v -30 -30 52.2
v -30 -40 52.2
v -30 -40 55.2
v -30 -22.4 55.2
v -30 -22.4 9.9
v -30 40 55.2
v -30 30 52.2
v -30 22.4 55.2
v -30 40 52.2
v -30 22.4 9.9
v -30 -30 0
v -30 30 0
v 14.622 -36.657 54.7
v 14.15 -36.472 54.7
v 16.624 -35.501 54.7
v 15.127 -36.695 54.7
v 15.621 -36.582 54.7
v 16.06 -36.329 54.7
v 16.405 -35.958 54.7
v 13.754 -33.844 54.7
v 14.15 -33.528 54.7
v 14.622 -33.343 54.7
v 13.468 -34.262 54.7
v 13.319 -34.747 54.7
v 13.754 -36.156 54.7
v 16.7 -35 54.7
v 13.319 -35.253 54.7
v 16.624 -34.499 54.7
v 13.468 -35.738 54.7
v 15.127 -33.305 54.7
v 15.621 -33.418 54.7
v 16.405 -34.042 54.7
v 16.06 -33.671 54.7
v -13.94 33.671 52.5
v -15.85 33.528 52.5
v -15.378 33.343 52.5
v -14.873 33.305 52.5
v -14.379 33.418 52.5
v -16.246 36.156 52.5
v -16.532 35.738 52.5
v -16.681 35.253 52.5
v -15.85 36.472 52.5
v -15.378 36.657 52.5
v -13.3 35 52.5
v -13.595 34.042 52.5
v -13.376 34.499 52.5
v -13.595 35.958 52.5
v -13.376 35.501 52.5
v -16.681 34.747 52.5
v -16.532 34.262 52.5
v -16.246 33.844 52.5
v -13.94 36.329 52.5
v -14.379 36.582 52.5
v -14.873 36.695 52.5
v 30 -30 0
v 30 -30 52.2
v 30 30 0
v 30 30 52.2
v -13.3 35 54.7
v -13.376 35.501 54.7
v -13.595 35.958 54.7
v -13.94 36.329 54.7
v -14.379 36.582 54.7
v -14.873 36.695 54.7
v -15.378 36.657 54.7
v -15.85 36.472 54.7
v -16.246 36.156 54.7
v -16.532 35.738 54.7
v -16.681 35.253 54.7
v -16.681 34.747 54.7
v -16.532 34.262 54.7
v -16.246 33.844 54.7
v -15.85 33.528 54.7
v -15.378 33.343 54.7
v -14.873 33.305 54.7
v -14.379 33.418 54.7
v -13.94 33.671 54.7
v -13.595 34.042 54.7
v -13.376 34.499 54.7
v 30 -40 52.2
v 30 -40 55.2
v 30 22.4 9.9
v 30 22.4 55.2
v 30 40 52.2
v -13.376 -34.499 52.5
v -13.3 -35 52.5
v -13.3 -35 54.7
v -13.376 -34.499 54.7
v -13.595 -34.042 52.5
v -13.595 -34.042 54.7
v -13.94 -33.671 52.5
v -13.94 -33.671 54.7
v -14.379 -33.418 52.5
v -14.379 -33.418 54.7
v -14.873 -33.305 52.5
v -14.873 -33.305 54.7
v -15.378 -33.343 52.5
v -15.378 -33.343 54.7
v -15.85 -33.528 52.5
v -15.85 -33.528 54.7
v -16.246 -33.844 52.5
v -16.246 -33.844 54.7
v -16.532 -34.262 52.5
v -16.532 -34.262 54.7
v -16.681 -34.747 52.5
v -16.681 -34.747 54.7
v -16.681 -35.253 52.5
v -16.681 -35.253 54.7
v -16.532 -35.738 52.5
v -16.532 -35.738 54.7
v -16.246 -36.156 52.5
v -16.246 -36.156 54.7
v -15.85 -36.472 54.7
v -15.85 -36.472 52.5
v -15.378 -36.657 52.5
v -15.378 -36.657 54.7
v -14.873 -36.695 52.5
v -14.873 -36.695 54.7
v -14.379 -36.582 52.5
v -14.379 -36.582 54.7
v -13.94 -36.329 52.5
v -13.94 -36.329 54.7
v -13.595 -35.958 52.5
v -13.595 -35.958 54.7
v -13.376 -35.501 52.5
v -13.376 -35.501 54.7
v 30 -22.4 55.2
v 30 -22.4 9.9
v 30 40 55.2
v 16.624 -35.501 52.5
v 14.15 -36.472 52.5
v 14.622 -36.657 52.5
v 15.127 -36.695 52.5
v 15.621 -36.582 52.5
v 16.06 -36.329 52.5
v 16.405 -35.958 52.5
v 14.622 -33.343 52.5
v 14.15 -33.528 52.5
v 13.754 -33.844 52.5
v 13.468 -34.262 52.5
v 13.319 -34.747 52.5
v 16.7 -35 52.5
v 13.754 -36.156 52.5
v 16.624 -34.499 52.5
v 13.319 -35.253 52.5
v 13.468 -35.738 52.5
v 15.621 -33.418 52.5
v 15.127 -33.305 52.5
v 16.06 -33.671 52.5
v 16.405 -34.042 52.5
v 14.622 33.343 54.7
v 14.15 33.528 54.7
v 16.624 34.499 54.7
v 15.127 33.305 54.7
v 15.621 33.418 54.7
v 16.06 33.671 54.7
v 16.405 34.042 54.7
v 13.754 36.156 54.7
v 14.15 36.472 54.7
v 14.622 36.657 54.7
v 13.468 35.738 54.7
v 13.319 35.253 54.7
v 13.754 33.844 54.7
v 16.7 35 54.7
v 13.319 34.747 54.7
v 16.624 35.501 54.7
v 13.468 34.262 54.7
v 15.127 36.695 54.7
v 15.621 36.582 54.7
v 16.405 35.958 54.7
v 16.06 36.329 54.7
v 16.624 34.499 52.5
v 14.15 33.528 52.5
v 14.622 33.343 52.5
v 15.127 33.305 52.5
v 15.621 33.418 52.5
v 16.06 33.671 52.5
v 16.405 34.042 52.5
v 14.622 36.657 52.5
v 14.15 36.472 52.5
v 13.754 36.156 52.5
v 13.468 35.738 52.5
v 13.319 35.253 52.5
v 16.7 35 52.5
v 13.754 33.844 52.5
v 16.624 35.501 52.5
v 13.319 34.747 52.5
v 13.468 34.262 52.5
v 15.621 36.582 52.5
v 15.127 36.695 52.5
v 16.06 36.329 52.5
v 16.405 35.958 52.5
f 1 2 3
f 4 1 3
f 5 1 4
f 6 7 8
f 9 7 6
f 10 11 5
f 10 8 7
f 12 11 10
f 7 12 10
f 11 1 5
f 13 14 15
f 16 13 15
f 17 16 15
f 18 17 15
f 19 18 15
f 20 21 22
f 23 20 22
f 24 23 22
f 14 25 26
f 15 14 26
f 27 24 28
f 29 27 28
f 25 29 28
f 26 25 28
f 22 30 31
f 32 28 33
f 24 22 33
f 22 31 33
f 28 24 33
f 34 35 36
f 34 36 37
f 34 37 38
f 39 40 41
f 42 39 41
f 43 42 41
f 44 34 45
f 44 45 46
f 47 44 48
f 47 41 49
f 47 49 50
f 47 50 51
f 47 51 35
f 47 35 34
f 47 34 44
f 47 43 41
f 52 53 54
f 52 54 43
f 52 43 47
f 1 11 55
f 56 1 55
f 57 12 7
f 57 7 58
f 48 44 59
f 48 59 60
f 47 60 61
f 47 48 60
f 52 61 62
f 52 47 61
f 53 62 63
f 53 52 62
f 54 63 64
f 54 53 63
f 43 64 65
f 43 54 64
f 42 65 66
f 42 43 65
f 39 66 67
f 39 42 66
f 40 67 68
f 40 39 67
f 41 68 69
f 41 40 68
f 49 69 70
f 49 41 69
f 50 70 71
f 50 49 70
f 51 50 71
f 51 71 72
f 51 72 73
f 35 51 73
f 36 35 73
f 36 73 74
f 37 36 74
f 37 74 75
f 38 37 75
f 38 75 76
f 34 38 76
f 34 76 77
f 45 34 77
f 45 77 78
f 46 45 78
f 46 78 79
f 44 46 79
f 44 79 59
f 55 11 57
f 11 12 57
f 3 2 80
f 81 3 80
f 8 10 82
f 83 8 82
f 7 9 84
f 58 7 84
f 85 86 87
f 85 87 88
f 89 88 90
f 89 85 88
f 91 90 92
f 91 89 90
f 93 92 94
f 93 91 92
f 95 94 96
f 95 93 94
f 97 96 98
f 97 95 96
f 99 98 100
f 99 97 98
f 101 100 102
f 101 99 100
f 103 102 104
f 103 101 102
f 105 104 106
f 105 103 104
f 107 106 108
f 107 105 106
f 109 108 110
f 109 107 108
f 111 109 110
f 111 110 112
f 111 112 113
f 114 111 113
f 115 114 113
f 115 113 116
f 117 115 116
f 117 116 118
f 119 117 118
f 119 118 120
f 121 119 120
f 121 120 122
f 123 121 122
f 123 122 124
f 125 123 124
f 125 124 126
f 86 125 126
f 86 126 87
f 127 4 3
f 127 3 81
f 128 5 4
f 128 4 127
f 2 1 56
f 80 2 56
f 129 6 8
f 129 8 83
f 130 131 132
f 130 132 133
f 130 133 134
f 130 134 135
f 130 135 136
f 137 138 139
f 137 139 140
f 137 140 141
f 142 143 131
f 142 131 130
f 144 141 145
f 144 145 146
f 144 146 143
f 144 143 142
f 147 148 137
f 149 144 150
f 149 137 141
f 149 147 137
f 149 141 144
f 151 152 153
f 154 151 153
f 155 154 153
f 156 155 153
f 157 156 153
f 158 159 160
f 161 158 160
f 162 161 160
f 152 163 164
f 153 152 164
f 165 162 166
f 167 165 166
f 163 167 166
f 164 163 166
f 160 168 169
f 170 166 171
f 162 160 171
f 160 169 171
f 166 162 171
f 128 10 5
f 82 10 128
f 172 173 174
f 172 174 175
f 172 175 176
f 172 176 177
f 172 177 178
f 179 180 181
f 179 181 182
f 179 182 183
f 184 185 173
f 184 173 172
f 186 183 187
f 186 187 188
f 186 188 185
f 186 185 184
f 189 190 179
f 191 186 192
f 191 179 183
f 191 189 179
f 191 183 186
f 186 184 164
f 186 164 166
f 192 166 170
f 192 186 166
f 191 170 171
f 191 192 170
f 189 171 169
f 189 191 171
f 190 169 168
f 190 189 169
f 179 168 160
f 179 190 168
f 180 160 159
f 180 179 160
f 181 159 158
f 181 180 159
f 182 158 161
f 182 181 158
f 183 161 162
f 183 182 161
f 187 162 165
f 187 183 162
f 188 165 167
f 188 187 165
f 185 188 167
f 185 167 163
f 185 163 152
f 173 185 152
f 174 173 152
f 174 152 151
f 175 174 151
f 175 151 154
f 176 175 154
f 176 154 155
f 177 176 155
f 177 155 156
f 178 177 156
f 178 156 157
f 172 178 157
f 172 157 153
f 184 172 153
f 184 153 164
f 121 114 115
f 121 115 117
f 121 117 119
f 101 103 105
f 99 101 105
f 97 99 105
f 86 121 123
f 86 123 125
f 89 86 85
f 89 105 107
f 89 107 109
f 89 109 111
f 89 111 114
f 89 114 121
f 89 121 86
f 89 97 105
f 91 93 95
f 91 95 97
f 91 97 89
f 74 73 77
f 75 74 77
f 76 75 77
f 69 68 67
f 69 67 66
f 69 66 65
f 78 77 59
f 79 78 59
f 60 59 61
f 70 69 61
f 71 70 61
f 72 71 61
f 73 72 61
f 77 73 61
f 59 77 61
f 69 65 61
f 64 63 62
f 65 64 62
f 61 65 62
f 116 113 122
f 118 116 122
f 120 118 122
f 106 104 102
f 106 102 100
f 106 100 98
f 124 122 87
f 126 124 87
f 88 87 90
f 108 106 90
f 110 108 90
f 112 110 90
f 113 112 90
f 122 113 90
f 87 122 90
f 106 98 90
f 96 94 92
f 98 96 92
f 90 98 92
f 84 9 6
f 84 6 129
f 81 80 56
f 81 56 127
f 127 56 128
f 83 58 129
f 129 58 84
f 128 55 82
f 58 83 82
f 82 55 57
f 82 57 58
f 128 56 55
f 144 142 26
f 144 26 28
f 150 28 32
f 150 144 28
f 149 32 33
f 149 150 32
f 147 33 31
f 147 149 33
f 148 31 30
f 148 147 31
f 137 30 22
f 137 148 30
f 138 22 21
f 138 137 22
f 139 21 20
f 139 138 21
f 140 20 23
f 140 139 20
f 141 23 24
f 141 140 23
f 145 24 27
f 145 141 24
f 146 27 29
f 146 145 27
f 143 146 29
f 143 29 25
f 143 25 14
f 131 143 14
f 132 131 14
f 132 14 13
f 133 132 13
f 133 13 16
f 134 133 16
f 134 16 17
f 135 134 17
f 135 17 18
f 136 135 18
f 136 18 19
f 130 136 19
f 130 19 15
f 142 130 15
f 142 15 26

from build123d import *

# Parameters (mm, degrees)
F0_W     = 60
F0_H     = 44.8
F1_DEPTH = 9.9
F0_H_2   = 7.6
F2_DEPTH = 55.2
F3_START = 52.2
F0_H_3   = 10
F0_R     = 1.7
F3_DEPTH = 3
F4_START = 52.2
F4_DEPTH = 0.3
F5_START = 54.7
F5_DEPTH = 0.5


with BuildPart() as f1:
    # F0 (on Top) → F1 (new body)
    with BuildSketch(Plane.XY):
        Rectangle(F0_W, F0_H)
    extrude(amount=F1_DEPTH)

    # F0 (on Top) → F2 (join)
    with BuildSketch(Plane.XY):
        with Locations((0, -26.2)):
            Rectangle(F0_W, F0_H_2)
        with Locations((0, 26.2)):
            Rectangle(F0_W, F0_H_2)
    extrude(amount=F2_DEPTH)

    # F0 (on Top) → F3 (join)
    with BuildSketch(Plane.XY.offset(F3_START)):
        with Locations((0, 35)):
            Rectangle(F0_W, F0_H_3)
        with Locations((-15, 35)):
            Circle(F0_R, mode=Mode.SUBTRACT)
        with Locations((15, 35)):
            Circle(F0_R, mode=Mode.SUBTRACT)
        with Locations((0, -35)):
            Rectangle(F0_W, F0_H_3)
        with Locations((-15, -35)):
            Circle(F0_R, mode=Mode.SUBTRACT)
        with Locations((15, -35)):
            Circle(F0_R, mode=Mode.SUBTRACT)
    extrude(amount=F3_DEPTH)

    # F0 (on Top) → F4 (join)
    with BuildSketch(Plane.XY.offset(F4_START)):
        with Locations((-15, 35)):
            Circle(F0_R)
        with Locations((15, 35)):
            Circle(F0_R)
        with Locations((-15, -35)):
            Circle(F0_R)
        with Locations((15, -35)):
            Circle(F0_R)
    extrude(amount=F4_DEPTH)

    # F0 (on Top) → F5 (join)
    with BuildSketch(Plane.XY.offset(F5_START)):
        with Locations((-15, 35)):
            Circle(F0_R)
        with Locations((15, 35)):
            Circle(F0_R)
        with Locations((-15, -35)):
            Circle(F0_R)
        with Locations((15, -35)):
            Circle(F0_R)
    extrude(amount=F5_DEPTH)


solid = f1.part
